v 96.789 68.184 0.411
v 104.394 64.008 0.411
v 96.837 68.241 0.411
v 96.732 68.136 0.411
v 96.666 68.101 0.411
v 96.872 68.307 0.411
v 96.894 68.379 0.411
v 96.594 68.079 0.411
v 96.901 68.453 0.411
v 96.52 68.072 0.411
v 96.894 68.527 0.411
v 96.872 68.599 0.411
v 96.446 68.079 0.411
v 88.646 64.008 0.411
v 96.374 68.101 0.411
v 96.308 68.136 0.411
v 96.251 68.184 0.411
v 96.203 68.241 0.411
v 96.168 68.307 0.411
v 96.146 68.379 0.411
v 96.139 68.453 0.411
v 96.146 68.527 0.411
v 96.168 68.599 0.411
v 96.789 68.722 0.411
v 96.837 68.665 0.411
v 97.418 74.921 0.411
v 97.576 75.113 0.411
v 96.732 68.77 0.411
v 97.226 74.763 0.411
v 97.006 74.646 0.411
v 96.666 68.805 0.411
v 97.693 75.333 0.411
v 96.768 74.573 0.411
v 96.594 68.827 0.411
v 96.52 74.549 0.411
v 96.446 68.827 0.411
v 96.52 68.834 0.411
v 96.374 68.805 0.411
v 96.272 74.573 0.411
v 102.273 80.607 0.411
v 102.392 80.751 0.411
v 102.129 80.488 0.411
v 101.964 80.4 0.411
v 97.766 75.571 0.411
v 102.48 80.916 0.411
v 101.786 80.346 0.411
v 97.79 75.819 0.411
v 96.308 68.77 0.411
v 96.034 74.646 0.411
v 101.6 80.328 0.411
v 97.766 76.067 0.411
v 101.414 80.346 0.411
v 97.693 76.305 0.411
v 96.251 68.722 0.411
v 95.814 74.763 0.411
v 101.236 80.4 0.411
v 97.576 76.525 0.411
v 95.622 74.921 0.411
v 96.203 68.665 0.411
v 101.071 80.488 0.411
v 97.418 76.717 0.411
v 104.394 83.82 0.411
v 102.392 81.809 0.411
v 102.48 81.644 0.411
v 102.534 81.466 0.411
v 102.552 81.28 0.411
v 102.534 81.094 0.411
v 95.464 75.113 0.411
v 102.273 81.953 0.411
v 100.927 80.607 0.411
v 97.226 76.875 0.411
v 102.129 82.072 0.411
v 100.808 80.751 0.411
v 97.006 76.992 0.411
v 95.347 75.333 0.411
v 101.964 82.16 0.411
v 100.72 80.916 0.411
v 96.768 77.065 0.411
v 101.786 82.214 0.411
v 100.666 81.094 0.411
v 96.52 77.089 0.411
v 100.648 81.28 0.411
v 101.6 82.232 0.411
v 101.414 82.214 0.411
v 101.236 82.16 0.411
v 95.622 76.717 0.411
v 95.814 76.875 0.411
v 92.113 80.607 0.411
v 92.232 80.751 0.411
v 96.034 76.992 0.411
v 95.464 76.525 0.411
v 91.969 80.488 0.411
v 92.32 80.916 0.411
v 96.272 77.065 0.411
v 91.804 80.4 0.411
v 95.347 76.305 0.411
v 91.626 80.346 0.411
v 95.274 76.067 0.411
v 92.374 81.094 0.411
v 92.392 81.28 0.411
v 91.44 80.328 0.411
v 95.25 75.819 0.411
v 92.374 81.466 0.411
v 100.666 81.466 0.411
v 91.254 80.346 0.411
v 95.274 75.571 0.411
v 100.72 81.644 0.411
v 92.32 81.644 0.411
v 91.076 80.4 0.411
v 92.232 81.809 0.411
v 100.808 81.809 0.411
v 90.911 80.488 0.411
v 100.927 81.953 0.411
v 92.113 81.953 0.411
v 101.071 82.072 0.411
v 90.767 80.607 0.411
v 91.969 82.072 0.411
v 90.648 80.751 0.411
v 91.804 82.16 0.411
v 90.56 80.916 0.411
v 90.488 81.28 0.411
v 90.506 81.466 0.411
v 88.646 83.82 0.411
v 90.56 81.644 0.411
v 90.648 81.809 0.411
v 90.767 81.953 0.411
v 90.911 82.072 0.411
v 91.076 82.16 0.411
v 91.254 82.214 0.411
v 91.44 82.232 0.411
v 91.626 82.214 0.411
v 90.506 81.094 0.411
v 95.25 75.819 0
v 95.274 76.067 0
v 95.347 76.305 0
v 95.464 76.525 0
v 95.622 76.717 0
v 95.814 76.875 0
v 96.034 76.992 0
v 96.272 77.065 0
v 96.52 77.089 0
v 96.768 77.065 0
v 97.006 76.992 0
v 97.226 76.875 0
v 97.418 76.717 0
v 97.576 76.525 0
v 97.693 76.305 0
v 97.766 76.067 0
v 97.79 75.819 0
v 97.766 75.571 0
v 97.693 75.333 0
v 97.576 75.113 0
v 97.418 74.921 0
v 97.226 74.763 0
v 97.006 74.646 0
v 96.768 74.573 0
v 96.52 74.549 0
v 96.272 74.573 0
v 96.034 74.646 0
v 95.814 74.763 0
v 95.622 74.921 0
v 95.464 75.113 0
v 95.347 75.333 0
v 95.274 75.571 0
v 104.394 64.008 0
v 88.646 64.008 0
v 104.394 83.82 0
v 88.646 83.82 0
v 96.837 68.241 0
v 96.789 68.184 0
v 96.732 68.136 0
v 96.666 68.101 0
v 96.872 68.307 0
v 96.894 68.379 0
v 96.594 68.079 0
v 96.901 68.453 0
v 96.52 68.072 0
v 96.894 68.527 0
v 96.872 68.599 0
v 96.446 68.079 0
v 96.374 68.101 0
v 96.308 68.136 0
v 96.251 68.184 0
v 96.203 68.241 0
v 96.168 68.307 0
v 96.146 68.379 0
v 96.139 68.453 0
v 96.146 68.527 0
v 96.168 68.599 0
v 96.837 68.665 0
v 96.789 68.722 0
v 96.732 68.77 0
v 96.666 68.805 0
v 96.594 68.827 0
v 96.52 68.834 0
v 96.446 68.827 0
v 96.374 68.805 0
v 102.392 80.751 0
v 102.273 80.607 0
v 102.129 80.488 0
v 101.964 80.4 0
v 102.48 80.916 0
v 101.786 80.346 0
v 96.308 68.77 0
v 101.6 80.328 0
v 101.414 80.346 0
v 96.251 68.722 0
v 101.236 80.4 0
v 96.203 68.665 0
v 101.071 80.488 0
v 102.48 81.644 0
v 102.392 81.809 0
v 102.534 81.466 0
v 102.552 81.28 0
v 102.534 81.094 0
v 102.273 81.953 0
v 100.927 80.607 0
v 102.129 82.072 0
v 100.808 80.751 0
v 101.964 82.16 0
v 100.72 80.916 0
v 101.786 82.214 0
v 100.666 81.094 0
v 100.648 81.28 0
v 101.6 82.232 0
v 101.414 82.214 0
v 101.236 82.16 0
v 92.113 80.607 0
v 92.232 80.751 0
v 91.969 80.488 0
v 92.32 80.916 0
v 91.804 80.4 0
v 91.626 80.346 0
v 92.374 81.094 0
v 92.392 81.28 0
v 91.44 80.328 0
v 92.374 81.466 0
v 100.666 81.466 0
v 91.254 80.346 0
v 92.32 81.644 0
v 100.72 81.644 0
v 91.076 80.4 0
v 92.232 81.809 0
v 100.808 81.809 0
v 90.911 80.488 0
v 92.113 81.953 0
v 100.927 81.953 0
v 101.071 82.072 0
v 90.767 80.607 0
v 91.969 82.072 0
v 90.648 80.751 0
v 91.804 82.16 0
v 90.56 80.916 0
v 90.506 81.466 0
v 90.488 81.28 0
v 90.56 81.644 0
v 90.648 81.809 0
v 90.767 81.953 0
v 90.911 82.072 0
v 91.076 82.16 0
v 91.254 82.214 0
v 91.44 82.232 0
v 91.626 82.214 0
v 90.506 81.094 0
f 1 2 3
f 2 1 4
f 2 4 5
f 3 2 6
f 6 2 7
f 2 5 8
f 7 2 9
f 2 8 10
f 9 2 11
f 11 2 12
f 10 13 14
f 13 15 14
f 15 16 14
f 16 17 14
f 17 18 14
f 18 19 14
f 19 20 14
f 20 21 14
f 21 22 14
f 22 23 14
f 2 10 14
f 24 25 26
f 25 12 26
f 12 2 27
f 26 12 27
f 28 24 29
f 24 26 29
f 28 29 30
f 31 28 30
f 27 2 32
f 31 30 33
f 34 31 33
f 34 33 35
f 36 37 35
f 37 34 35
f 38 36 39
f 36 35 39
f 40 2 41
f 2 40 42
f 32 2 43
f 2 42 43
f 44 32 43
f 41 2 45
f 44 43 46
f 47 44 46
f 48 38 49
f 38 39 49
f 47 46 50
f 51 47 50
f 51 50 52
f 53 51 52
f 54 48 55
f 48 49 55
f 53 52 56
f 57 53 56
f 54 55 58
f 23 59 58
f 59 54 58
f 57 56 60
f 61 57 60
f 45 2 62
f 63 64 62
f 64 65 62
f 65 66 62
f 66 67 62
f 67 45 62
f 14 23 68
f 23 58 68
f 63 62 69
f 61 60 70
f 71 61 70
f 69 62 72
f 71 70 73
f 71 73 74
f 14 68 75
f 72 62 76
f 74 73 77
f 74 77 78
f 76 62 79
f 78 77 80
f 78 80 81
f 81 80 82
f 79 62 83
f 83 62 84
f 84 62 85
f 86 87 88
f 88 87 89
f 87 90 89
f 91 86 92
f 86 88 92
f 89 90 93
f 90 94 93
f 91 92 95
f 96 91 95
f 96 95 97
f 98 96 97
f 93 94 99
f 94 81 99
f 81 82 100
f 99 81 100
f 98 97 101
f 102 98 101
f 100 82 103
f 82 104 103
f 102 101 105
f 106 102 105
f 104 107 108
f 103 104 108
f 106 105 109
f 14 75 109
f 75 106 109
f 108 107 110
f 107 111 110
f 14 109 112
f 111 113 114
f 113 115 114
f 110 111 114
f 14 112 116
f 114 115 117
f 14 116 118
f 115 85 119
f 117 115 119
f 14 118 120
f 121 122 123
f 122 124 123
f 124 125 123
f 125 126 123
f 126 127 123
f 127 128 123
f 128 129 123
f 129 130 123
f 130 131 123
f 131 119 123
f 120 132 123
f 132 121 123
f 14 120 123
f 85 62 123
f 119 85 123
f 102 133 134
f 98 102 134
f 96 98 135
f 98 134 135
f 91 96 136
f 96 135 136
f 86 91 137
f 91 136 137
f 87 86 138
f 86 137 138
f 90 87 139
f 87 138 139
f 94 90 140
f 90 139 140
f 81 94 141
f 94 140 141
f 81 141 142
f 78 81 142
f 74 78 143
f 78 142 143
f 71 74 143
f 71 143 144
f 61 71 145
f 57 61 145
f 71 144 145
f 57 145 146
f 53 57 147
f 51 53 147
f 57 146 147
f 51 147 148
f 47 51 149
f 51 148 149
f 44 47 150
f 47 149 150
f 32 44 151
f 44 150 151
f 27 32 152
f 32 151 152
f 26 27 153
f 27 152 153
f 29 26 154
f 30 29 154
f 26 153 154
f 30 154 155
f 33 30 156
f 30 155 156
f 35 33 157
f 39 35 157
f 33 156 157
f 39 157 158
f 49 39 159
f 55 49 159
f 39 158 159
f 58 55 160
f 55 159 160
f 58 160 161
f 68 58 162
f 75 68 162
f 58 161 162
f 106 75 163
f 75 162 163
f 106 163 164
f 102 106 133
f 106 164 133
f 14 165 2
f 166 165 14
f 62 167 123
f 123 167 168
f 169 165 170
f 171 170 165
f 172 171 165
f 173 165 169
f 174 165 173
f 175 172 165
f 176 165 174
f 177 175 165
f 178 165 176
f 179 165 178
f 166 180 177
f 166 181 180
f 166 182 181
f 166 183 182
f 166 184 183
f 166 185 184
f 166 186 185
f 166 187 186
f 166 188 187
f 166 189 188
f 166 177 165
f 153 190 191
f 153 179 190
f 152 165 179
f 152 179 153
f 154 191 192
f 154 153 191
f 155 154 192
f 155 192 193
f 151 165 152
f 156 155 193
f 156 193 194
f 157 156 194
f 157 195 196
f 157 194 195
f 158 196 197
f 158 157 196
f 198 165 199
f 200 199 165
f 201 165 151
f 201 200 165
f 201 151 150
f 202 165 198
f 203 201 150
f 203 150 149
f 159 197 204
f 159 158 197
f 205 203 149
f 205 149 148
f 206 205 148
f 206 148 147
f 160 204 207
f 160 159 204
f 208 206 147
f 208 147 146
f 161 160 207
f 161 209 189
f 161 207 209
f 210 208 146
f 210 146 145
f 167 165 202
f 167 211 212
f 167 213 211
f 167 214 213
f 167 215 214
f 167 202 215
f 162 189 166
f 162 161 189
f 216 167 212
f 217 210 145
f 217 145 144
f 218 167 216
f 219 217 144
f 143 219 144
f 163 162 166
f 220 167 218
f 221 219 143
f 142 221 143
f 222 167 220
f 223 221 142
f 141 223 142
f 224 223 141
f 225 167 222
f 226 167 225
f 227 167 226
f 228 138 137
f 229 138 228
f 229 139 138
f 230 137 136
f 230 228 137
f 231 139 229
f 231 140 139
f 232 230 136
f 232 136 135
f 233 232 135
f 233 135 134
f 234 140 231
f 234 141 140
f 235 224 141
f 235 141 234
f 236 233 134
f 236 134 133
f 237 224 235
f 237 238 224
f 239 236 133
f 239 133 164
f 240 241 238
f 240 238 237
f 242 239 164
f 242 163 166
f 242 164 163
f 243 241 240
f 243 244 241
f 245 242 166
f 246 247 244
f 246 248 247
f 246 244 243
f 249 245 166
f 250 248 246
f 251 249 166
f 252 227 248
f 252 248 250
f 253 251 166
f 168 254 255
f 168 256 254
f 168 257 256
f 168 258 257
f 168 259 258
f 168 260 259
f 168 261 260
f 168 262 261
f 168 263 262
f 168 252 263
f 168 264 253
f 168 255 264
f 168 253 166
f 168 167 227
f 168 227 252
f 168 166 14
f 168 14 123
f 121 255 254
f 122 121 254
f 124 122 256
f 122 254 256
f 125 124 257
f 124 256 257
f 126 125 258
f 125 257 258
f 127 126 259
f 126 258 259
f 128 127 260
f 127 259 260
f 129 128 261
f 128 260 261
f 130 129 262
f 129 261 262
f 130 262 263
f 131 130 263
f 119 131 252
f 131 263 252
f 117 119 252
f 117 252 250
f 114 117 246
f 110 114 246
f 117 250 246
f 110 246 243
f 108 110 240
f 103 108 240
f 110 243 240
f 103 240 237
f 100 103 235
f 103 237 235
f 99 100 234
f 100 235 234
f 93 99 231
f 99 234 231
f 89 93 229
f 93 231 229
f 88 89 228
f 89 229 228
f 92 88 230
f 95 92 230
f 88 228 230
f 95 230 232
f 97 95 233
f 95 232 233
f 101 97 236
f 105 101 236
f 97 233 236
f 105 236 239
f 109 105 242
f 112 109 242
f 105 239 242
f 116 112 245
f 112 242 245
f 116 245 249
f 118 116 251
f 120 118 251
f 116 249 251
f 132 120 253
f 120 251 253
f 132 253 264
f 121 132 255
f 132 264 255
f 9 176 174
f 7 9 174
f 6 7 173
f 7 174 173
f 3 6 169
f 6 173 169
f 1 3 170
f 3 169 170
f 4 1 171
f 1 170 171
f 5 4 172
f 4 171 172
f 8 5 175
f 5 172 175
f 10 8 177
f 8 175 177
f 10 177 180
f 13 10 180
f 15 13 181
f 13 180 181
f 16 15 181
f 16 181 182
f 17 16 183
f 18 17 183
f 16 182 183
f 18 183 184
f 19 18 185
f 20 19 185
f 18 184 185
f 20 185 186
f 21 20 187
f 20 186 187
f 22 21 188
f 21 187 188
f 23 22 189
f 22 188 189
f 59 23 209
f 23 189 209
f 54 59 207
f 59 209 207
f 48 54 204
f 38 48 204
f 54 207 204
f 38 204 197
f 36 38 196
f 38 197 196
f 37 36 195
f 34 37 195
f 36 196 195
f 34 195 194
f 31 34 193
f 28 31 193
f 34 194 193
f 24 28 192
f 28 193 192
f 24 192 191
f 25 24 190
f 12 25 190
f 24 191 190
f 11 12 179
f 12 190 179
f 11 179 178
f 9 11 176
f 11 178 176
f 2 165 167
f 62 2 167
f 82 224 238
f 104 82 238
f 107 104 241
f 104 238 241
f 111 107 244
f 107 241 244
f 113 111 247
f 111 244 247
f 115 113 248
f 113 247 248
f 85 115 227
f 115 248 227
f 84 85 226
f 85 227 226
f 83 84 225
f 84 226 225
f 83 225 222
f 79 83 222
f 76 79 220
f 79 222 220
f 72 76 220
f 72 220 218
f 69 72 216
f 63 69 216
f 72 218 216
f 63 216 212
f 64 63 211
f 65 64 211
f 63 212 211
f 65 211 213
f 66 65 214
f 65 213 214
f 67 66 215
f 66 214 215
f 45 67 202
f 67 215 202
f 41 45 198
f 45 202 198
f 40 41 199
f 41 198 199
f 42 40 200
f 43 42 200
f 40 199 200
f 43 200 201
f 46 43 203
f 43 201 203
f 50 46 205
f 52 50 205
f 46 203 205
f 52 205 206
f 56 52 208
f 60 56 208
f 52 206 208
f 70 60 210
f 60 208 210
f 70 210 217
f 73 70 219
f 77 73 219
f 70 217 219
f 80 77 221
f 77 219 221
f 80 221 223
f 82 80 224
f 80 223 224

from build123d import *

# Parameters (mm, degrees)
SKETCH1_W           = 15.748
SKETCH1_H           = 19.812
SKETCH1_R           = 1.27
SKETCH1_R_2         = 0.952
SKETCH1_R_3         = 0.381
BOSS_EXTRUDE1_DEPTH = 0.41148


with BuildPart() as part:
    # Sketch1 → Boss-Extrude1 (new body)
    with BuildSketch(Plane(origin=(0, 0, 0), x_dir=(-1, 0, 0), z_dir=(0, 0, -1))):
        with Locations((-96.52, 73.914)):
            Rectangle(SKETCH1_W, SKETCH1_H)
        with Locations((-96.52, 75.819)):
            Circle(SKETCH1_R, mode=Mode.SUBTRACT)
        with Locations((-91.44, 81.28)):
            Circle(SKETCH1_R_2, mode=Mode.SUBTRACT)
        with Locations(Location((-96.52, 68.453, 0), (0, 0, 180))):
            Circle(SKETCH1_R_3, mode=Mode.SUBTRACT)
        with Locations((-101.6, 81.28)):
            Circle(SKETCH1_R_2, mode=Mode.SUBTRACT)
    extrude(amount=-BOSS_EXTRUDE1_DEPTH)


solid = part.part
